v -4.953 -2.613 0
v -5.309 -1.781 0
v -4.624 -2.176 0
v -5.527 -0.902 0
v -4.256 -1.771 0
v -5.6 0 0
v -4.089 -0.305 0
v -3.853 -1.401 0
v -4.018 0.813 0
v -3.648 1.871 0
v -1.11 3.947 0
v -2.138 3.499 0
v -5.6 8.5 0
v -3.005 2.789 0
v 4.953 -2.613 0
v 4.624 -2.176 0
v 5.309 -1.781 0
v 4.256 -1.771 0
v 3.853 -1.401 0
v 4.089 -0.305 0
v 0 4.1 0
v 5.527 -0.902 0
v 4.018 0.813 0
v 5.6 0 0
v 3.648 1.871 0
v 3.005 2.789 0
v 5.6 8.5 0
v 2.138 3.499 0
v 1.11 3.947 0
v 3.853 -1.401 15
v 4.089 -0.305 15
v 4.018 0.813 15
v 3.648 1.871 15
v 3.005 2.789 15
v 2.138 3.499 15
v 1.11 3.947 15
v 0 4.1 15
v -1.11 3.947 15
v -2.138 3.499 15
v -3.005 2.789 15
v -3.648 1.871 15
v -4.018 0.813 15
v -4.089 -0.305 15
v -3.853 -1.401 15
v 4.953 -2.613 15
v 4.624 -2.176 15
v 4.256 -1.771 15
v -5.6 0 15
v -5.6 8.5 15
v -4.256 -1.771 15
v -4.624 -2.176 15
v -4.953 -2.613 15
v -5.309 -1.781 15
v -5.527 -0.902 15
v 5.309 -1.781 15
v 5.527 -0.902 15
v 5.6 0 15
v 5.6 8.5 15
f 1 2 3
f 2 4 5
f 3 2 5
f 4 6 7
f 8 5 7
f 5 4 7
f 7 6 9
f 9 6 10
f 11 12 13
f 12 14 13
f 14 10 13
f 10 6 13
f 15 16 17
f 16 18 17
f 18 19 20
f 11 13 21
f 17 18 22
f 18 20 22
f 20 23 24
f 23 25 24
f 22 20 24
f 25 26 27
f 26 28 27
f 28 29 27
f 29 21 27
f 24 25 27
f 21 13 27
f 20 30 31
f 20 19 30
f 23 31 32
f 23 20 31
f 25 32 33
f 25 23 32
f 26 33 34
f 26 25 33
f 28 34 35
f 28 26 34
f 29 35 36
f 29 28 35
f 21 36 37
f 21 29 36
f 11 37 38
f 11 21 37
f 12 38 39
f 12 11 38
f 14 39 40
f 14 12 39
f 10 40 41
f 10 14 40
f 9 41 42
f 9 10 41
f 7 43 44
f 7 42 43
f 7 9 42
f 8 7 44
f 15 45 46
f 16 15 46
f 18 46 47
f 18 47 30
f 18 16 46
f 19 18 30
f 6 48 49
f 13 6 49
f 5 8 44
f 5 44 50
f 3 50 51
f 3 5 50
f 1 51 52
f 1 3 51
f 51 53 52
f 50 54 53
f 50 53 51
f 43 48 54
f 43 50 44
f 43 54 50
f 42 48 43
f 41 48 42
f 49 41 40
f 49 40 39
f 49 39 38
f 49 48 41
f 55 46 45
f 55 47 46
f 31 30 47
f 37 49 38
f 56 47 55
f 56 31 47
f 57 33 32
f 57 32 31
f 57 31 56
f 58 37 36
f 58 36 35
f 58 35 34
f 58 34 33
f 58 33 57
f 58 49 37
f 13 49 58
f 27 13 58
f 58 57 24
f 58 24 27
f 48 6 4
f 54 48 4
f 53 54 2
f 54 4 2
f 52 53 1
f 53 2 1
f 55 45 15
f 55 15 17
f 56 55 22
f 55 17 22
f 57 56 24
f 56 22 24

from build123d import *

# Parameters (mm, degrees)
CYLINDER098_R     = 6
CYLINDER098_DEPTH = 15
CYLINDER096_R     = 4.1
CYLINDER096_DEPTH = 15
BOX053_W          = 11.2
BOX053_H          = 8.5
BOX053_DEPTH      = 15
CYLINDER097_R     = 5.6
CYLINDER097_DEPTH = 15


with BuildPart() as zylinder089:
    # Cylinder098 → Cylinder098 (new body)
    with BuildSketch(Plane(origin=(0, -6, 0), x_dir=(1, 0, 0), z_dir=(0, 0, 1))):
        Circle(CYLINDER098_R)
    extrude(amount=CYLINDER098_DEPTH)


with BuildPart() as zylinder087:
    # Cylinder096 → Cylinder096 (new body)
    with BuildSketch(Plane.XY):
        Circle(CYLINDER096_R)
    extrude(amount=CYLINDER096_DEPTH)


with BuildPart() as w_rfel052:
    # Box053 → Box053 (new body)
    with BuildSketch(Plane(origin=(-5.6, 0, 0), x_dir=(1, 0, 0), z_dir=(0, 0, 1))):
        with Locations((5.6, 4.25)):
            Rectangle(BOX053_W, BOX053_H)
    extrude(amount=BOX053_DEPTH)


with BuildPart() as cut011004014002011:
    # Cylinder097 → Cylinder097 (new body)
    with BuildSketch(Plane.XY):
        Circle(CYLINDER097_R)
    extrude(amount=CYLINDER097_DEPTH)

    # Fusion026038: union Würfel052
    add(w_rfel052.part)

    # Cut011004014002010: cut Zylinder087
    add(zylinder087.part, mode=Mode.SUBTRACT)

    # Cut011004014002011: cut Zylinder089
    add(zylinder089.part, mode=Mode.SUBTRACT)


solid = cut011004014002011.part
